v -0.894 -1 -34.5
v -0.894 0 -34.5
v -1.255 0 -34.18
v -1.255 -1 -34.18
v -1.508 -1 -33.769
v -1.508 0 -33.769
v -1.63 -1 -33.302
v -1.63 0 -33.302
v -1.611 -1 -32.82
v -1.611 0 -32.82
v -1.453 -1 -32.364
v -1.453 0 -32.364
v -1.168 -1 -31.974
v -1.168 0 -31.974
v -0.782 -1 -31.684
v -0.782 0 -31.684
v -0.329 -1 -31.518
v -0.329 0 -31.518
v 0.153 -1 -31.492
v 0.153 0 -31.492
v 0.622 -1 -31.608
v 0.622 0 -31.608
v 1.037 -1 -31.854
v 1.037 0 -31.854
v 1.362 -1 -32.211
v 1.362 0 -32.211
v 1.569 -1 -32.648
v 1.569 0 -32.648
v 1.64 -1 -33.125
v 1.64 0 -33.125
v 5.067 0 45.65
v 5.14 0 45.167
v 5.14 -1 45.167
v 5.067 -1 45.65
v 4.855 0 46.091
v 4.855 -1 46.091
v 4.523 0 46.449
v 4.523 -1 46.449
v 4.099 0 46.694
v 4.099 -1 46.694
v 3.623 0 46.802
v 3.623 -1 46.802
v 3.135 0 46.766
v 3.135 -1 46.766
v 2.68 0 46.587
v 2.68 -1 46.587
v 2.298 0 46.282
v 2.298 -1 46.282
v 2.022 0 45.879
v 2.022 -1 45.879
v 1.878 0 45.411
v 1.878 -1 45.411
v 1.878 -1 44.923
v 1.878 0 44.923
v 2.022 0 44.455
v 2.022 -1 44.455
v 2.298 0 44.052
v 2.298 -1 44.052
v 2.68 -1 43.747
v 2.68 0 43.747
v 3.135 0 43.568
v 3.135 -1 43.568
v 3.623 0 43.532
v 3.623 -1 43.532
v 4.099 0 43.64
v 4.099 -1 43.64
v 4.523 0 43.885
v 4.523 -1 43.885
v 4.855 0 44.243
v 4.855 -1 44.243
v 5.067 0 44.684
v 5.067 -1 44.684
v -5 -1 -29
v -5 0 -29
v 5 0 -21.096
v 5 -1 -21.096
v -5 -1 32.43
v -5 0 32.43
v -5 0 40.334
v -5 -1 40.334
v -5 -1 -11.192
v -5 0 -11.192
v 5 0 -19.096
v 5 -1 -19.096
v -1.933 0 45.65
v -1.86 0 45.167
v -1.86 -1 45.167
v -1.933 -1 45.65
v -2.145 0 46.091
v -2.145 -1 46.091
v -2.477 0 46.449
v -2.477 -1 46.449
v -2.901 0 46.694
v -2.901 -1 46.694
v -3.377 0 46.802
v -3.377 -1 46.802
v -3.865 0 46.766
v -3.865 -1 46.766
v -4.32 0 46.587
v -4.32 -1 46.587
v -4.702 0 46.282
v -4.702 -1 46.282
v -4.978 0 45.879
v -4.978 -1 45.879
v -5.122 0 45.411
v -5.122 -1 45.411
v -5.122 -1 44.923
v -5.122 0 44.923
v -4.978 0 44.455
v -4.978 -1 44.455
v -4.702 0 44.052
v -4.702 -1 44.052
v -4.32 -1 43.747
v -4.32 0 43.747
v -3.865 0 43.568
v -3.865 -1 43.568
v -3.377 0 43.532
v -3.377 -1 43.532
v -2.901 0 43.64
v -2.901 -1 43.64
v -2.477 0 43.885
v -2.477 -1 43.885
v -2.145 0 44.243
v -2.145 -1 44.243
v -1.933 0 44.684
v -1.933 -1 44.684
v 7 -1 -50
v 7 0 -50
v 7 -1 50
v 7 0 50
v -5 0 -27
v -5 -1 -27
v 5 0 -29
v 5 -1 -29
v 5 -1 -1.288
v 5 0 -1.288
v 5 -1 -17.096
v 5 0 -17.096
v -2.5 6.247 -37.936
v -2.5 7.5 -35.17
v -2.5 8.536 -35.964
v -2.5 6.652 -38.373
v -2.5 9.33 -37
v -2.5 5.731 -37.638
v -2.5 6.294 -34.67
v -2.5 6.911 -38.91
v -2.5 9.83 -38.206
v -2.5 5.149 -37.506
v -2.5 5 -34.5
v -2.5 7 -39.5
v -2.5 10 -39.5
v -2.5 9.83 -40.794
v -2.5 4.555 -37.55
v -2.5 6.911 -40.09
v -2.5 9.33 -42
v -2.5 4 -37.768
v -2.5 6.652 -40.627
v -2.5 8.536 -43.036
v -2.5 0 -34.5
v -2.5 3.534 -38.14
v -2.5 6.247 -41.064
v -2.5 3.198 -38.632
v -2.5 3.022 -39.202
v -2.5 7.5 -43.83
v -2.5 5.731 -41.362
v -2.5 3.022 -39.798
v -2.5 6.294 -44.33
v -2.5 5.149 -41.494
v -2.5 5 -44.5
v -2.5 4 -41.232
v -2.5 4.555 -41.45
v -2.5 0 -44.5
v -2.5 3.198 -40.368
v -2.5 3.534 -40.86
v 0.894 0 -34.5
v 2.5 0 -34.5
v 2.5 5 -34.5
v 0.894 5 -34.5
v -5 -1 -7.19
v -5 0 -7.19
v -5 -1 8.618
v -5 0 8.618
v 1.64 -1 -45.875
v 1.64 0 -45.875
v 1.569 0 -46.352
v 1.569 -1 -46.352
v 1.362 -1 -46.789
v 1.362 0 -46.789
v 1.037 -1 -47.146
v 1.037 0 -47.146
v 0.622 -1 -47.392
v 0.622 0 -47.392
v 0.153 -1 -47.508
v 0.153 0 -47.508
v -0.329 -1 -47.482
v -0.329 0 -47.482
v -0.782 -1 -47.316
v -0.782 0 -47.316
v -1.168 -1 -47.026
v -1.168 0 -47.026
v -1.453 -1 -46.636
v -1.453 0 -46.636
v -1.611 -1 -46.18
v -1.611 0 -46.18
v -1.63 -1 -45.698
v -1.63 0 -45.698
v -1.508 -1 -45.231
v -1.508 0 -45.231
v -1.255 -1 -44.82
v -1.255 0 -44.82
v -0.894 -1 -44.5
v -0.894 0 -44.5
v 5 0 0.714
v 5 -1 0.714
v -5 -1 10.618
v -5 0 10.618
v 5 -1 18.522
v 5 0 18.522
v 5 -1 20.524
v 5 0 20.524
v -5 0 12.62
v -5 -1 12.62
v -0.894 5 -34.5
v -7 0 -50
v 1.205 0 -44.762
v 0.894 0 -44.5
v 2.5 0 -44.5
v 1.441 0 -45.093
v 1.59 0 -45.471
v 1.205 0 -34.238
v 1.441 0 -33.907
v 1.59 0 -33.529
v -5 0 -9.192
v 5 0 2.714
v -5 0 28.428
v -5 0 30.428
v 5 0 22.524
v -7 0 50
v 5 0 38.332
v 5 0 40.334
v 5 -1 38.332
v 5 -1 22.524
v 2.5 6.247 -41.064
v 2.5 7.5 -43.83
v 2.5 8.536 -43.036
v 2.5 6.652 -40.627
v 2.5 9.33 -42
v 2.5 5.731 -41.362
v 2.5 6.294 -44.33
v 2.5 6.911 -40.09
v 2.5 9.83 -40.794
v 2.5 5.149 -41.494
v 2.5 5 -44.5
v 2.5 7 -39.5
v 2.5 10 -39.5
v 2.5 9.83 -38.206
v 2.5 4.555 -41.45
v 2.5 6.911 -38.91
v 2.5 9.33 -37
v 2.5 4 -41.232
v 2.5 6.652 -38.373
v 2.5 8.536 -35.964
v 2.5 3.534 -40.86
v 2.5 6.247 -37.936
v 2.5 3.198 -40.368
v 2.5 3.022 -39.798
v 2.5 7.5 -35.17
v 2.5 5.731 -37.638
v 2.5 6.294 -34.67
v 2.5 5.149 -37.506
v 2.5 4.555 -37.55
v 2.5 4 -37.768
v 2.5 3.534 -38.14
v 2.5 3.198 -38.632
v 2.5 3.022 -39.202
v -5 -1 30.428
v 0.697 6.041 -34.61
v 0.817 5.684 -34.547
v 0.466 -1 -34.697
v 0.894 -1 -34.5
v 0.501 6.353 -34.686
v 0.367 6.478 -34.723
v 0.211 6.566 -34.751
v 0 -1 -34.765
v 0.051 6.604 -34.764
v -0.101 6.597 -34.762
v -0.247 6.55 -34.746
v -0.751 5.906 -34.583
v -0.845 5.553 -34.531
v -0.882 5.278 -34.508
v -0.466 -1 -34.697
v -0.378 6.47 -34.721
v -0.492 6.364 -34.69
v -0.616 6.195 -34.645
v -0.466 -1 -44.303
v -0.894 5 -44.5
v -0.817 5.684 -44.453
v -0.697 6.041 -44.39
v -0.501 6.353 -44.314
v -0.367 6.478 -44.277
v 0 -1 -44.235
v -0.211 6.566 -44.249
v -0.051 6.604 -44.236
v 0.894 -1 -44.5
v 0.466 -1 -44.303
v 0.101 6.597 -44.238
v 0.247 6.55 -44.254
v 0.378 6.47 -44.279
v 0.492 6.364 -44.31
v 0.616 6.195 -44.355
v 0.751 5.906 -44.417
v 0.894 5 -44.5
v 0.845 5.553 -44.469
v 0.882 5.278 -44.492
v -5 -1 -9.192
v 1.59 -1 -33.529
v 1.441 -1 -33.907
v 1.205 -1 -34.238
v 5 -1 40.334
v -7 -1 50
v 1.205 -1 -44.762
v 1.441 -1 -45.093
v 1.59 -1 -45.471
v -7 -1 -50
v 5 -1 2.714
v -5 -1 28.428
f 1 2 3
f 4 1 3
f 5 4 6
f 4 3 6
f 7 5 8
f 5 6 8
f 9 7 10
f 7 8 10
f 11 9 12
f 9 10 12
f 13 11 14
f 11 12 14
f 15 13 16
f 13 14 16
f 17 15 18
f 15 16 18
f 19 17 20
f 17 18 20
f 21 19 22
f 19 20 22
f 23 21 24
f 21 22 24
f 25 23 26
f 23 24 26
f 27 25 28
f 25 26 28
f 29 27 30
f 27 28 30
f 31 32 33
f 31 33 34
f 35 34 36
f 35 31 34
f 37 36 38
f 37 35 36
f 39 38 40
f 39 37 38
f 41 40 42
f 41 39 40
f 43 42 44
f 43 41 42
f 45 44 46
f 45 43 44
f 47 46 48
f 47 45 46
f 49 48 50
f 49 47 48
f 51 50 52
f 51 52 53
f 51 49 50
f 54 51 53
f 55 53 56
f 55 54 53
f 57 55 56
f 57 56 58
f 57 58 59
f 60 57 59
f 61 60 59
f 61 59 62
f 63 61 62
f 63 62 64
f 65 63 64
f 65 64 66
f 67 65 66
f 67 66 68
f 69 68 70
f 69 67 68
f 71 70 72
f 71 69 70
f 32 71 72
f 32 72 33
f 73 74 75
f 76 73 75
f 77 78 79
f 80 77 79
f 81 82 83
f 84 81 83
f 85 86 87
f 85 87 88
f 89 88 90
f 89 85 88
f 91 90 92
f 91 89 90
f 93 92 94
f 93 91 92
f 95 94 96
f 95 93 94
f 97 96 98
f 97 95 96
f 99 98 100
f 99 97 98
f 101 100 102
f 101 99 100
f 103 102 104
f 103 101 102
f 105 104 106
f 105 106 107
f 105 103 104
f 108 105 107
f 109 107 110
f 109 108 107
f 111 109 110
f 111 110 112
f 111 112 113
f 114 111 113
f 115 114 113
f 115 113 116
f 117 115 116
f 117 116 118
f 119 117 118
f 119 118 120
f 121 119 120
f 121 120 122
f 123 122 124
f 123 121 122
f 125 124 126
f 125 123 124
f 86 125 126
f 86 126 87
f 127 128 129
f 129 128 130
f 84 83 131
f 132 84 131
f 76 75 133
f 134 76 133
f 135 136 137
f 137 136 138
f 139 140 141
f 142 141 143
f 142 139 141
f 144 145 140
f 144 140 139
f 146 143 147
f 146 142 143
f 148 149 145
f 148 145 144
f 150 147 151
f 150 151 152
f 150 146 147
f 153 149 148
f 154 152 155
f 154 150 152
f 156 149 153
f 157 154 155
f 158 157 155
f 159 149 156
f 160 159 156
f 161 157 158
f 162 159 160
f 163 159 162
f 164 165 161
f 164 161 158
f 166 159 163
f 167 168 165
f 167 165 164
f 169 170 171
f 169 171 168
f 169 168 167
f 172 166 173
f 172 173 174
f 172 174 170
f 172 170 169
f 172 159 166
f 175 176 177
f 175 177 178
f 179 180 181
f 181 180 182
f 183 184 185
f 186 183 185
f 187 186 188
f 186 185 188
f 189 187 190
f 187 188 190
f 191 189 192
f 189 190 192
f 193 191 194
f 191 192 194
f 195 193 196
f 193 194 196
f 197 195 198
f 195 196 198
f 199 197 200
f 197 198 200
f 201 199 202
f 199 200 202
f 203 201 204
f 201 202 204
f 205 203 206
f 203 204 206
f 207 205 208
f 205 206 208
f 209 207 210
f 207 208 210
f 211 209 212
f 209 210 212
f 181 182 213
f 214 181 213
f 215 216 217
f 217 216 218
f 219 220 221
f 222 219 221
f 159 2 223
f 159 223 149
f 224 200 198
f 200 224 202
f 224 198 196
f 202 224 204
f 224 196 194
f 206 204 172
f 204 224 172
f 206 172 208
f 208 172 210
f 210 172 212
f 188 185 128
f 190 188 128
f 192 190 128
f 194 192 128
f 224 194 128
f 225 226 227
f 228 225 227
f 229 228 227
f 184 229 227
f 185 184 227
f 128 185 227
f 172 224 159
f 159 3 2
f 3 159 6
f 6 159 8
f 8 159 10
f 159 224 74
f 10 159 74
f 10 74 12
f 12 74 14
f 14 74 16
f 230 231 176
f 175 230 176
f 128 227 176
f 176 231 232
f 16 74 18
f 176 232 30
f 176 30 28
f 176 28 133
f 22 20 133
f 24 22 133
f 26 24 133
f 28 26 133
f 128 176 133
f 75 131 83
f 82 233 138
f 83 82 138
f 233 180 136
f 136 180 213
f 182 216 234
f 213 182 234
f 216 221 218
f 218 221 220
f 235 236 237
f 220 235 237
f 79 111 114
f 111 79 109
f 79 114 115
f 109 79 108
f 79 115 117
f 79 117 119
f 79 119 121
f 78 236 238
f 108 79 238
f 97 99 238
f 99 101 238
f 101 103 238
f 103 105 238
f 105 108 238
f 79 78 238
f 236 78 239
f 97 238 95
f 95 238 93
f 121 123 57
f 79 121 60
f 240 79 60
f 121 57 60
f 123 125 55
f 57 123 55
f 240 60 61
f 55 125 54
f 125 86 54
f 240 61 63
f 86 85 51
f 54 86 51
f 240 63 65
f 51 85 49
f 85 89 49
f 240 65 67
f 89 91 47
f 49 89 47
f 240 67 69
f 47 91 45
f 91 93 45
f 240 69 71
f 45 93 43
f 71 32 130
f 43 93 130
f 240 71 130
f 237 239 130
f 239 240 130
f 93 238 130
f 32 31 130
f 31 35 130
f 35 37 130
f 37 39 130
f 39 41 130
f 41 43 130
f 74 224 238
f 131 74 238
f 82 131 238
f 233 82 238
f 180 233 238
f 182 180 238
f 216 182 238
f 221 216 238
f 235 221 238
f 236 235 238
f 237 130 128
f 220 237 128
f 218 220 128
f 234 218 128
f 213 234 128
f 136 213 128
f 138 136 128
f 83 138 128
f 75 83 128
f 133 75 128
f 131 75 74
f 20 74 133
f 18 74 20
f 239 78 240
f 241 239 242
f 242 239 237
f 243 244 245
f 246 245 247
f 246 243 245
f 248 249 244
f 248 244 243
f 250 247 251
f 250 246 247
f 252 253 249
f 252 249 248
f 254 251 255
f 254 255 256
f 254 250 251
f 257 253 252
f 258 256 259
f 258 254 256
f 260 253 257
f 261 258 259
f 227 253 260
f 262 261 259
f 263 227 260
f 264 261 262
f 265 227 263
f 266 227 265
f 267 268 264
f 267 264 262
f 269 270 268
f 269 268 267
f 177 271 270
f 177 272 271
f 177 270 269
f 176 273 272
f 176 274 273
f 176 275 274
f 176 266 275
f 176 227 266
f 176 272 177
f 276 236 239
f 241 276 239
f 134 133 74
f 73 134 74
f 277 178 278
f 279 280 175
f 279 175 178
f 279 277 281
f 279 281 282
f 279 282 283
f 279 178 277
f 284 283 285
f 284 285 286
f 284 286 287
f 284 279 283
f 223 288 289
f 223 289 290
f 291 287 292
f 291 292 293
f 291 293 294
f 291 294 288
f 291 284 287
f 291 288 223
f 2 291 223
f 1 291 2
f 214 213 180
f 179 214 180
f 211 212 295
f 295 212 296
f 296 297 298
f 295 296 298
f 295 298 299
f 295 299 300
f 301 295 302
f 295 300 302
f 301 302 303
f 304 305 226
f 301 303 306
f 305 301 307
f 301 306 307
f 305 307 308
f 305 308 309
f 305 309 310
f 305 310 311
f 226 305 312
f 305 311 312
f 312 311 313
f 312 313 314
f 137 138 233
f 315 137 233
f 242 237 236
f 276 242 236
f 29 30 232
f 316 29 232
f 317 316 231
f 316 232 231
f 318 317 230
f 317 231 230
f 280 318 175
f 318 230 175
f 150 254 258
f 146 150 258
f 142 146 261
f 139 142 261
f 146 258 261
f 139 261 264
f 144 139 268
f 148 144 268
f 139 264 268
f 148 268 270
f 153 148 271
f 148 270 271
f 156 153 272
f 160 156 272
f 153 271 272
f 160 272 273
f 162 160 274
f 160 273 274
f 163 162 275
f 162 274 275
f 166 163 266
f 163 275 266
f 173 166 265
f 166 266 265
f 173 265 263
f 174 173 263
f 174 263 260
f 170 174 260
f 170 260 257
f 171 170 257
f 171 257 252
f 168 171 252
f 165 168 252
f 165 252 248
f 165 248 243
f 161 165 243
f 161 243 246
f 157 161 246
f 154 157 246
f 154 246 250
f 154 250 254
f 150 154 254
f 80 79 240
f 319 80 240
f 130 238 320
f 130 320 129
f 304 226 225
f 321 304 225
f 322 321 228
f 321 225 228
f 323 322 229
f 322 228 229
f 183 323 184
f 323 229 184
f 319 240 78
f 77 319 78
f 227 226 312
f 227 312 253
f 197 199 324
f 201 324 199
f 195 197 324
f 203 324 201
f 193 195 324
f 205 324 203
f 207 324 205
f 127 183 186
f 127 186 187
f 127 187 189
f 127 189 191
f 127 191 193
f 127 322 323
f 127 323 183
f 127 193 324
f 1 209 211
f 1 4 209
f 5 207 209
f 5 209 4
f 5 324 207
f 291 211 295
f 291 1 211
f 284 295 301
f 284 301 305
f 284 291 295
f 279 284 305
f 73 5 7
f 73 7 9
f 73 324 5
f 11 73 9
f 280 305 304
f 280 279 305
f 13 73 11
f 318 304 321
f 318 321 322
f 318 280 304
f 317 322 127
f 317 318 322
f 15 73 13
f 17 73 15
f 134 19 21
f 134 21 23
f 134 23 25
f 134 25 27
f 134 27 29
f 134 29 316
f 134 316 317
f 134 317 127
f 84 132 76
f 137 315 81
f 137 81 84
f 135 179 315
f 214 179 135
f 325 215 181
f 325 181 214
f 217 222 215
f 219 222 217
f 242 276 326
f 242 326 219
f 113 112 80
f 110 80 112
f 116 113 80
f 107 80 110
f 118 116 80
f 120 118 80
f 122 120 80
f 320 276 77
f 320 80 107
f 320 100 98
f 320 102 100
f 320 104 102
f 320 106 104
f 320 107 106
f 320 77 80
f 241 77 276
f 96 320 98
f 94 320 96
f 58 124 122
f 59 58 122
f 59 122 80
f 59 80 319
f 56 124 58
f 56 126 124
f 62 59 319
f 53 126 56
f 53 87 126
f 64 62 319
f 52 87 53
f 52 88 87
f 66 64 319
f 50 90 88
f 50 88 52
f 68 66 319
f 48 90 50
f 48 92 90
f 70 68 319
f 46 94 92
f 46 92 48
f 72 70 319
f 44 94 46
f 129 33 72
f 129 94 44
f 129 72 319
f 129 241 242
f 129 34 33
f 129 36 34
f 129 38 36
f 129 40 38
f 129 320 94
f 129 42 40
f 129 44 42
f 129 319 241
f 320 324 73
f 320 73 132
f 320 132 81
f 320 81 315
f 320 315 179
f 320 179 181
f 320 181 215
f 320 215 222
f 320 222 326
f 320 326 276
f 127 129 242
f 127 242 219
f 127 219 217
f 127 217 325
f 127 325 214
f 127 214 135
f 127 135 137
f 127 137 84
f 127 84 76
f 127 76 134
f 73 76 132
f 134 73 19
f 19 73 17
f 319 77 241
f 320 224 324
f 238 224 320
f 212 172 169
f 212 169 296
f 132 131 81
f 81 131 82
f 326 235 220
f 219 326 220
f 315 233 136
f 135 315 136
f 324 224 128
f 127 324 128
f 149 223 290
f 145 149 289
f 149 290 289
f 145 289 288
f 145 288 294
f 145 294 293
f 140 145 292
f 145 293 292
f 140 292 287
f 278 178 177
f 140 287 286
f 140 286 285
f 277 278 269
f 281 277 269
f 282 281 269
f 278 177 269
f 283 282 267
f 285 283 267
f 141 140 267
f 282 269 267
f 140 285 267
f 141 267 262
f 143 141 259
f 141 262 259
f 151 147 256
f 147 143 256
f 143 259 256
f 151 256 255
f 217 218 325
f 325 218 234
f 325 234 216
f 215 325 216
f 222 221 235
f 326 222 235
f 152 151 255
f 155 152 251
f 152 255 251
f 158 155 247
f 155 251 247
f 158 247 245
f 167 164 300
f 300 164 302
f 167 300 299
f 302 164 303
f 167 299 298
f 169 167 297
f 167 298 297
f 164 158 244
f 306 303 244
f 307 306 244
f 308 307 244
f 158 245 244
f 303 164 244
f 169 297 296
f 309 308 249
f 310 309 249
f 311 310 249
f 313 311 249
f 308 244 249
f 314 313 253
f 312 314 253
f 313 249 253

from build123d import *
from build123d import SkipClean  # not in build123d's __all__

# Parameters (mm, degrees)
F0_W     = 14
F0_H     = 100
F0_R     = 1.64
F1_DEPTH = 1
F2_DEPTH = 10
F3_R     = 2
F4_DEPTH = 9.501


# Not quite as in the source:
# - after a boolean that leaves OpenCascade's solid faulty, fix() repairs it
# - a feature names something its author has since deleted; it is built from what else it names


with BuildPart() as f1:
    # F0 (on Front) → F1 (new body)
    with BuildSketch(Plane.XZ):
        Rectangle(F0_W, F0_H)
        with BuildLine():
            Line((-2.5, -44.5), (-2.5, -34.5))
            Line((-2.5, -34.5), (-0.8938540149, -34.5))
            ThreePointArc((-0.8938540149, -34.5), (-0.7822018331, -31.6835561779), (1.64, -33.125))
            ThreePointArc((1.64, -33.125), (1.4414438221, -33.9072018331), (0.8938540149, -34.5))
            Line((0.8938540149, -34.5), (2.5, -34.5))
            Line((2.5, -34.5), (2.5, -44.5))
            Line((2.5, -44.5), (0.8938540149, -44.5))
            ThreePointArc((0.8938540149, -44.5), (1.4414438221, -45.0927981669), (1.64, -45.875))
            ThreePointArc((1.64, -45.875), (-0.7822018331, -47.3164438221), (-0.8938540149, -44.5))
            Line((-0.8938540149, -44.5), (-2.5, -44.5))
        make_face(mode=Mode.SUBTRACT)
        Polygon((5, -21.096), (5, -29), (-5, -29), align=None, mode=Mode.SUBTRACT)
        Polygon((5, -19.096), (-5, -27), (-5, -11.192), align=None, mode=Mode.SUBTRACT)
        Polygon((5, -17.096), (-5, -9.192), (5, -1.288), align=None, mode=Mode.SUBTRACT)
        with Locations((-3.5, 45.167)):
            Circle(F0_R, mode=Mode.SUBTRACT)
        Polygon((-5, -7.19), (-5, 8.618), (5, 0.714), align=None, mode=Mode.SUBTRACT)
        Polygon((5, 18.522), (5, 2.714), (-5, 10.618), align=None, mode=Mode.SUBTRACT)
        Polygon((-5, 12.62), (-5, 28.428), (5, 20.524), align=None, mode=Mode.SUBTRACT)
        Polygon((5, 38.332), (5, 22.524), (-5, 30.428), align=None, mode=Mode.SUBTRACT)
        Polygon((5, 40.334), (-5, 32.43), (-5, 40.334), align=None, mode=Mode.SUBTRACT)
        with Locations((3.5, 45.167)):
            Circle(F0_R, mode=Mode.SUBTRACT)
        with BuildLine():
            Line((-0.8938540149, -34.5), (-2.5, -34.5))
            Line((-2.5, -34.5), (-2.5, -44.5))
            Line((-2.5, -44.5), (-0.8938540149, -44.5))
            ThreePointArc((-0.8938540149, -44.5), (0, -44.235), (0.8938540149, -44.5))
            Line((0.8938540149, -44.5), (2.5, -44.5))
            Line((2.5, -44.5), (2.5, -34.5))
            Line((2.5, -34.5), (0.8938540149, -34.5))
            ThreePointArc((0.8938540149, -34.5), (0, -34.765), (-0.8938540149, -34.5))
        make_face()
    extrude(amount=F1_DEPTH)

    # F0 (on Front) → F2 (join)
    with BuildSketch(Plane.XZ):
        with BuildLine():
            Line((-0.8938540149, -34.5), (-2.5, -34.5))
            Line((-2.5, -34.5), (-2.5, -44.5))
            Line((-2.5, -44.5), (-0.8938540149, -44.5))
            ThreePointArc((-0.8938540149, -44.5), (0, -44.235), (0.8938540149, -44.5))
            Line((0.8938540149, -44.5), (2.5, -44.5))
            Line((2.5, -44.5), (2.5, -34.5))
            Line((2.5, -34.5), (0.8938540149, -34.5))
            ThreePointArc((0.8938540149, -34.5), (0, -34.765), (-0.8938540149, -34.5))
        make_face()
    with SkipClean():  # cleaning this boolean's faces spoils the solid; the shape is the same uncleaned
        extrude(amount=-F2_DEPTH)

    # F3 (on face) → F4 (cut, through all)
    with BuildSketch(Plane.YZ.offset(2.5)):
        with BuildLine():
            Line((5, -44.5), (10, -44.5))
            Line((10, -44.5), (10, -39.5))
            ThreePointArc((10, -39.5), (8.5355339059, -43.0355339059), (5, -44.5))
        make_face()
        with Locations((5, -39.5)):
            Circle(F3_R)
        with BuildLine():
            ThreePointArc((5, -34.5), (8.5355339059, -35.9644660941), (10, -39.5))
            Line((10, -39.5), (10, -34.5))
            Line((10, -34.5), (5, -34.5))
        make_face()
    extrude(amount=-F4_DEPTH, mode=Mode.SUBTRACT)

    add(f1.part.fix(), mode=Mode.REPLACE)


solid = f1.part
